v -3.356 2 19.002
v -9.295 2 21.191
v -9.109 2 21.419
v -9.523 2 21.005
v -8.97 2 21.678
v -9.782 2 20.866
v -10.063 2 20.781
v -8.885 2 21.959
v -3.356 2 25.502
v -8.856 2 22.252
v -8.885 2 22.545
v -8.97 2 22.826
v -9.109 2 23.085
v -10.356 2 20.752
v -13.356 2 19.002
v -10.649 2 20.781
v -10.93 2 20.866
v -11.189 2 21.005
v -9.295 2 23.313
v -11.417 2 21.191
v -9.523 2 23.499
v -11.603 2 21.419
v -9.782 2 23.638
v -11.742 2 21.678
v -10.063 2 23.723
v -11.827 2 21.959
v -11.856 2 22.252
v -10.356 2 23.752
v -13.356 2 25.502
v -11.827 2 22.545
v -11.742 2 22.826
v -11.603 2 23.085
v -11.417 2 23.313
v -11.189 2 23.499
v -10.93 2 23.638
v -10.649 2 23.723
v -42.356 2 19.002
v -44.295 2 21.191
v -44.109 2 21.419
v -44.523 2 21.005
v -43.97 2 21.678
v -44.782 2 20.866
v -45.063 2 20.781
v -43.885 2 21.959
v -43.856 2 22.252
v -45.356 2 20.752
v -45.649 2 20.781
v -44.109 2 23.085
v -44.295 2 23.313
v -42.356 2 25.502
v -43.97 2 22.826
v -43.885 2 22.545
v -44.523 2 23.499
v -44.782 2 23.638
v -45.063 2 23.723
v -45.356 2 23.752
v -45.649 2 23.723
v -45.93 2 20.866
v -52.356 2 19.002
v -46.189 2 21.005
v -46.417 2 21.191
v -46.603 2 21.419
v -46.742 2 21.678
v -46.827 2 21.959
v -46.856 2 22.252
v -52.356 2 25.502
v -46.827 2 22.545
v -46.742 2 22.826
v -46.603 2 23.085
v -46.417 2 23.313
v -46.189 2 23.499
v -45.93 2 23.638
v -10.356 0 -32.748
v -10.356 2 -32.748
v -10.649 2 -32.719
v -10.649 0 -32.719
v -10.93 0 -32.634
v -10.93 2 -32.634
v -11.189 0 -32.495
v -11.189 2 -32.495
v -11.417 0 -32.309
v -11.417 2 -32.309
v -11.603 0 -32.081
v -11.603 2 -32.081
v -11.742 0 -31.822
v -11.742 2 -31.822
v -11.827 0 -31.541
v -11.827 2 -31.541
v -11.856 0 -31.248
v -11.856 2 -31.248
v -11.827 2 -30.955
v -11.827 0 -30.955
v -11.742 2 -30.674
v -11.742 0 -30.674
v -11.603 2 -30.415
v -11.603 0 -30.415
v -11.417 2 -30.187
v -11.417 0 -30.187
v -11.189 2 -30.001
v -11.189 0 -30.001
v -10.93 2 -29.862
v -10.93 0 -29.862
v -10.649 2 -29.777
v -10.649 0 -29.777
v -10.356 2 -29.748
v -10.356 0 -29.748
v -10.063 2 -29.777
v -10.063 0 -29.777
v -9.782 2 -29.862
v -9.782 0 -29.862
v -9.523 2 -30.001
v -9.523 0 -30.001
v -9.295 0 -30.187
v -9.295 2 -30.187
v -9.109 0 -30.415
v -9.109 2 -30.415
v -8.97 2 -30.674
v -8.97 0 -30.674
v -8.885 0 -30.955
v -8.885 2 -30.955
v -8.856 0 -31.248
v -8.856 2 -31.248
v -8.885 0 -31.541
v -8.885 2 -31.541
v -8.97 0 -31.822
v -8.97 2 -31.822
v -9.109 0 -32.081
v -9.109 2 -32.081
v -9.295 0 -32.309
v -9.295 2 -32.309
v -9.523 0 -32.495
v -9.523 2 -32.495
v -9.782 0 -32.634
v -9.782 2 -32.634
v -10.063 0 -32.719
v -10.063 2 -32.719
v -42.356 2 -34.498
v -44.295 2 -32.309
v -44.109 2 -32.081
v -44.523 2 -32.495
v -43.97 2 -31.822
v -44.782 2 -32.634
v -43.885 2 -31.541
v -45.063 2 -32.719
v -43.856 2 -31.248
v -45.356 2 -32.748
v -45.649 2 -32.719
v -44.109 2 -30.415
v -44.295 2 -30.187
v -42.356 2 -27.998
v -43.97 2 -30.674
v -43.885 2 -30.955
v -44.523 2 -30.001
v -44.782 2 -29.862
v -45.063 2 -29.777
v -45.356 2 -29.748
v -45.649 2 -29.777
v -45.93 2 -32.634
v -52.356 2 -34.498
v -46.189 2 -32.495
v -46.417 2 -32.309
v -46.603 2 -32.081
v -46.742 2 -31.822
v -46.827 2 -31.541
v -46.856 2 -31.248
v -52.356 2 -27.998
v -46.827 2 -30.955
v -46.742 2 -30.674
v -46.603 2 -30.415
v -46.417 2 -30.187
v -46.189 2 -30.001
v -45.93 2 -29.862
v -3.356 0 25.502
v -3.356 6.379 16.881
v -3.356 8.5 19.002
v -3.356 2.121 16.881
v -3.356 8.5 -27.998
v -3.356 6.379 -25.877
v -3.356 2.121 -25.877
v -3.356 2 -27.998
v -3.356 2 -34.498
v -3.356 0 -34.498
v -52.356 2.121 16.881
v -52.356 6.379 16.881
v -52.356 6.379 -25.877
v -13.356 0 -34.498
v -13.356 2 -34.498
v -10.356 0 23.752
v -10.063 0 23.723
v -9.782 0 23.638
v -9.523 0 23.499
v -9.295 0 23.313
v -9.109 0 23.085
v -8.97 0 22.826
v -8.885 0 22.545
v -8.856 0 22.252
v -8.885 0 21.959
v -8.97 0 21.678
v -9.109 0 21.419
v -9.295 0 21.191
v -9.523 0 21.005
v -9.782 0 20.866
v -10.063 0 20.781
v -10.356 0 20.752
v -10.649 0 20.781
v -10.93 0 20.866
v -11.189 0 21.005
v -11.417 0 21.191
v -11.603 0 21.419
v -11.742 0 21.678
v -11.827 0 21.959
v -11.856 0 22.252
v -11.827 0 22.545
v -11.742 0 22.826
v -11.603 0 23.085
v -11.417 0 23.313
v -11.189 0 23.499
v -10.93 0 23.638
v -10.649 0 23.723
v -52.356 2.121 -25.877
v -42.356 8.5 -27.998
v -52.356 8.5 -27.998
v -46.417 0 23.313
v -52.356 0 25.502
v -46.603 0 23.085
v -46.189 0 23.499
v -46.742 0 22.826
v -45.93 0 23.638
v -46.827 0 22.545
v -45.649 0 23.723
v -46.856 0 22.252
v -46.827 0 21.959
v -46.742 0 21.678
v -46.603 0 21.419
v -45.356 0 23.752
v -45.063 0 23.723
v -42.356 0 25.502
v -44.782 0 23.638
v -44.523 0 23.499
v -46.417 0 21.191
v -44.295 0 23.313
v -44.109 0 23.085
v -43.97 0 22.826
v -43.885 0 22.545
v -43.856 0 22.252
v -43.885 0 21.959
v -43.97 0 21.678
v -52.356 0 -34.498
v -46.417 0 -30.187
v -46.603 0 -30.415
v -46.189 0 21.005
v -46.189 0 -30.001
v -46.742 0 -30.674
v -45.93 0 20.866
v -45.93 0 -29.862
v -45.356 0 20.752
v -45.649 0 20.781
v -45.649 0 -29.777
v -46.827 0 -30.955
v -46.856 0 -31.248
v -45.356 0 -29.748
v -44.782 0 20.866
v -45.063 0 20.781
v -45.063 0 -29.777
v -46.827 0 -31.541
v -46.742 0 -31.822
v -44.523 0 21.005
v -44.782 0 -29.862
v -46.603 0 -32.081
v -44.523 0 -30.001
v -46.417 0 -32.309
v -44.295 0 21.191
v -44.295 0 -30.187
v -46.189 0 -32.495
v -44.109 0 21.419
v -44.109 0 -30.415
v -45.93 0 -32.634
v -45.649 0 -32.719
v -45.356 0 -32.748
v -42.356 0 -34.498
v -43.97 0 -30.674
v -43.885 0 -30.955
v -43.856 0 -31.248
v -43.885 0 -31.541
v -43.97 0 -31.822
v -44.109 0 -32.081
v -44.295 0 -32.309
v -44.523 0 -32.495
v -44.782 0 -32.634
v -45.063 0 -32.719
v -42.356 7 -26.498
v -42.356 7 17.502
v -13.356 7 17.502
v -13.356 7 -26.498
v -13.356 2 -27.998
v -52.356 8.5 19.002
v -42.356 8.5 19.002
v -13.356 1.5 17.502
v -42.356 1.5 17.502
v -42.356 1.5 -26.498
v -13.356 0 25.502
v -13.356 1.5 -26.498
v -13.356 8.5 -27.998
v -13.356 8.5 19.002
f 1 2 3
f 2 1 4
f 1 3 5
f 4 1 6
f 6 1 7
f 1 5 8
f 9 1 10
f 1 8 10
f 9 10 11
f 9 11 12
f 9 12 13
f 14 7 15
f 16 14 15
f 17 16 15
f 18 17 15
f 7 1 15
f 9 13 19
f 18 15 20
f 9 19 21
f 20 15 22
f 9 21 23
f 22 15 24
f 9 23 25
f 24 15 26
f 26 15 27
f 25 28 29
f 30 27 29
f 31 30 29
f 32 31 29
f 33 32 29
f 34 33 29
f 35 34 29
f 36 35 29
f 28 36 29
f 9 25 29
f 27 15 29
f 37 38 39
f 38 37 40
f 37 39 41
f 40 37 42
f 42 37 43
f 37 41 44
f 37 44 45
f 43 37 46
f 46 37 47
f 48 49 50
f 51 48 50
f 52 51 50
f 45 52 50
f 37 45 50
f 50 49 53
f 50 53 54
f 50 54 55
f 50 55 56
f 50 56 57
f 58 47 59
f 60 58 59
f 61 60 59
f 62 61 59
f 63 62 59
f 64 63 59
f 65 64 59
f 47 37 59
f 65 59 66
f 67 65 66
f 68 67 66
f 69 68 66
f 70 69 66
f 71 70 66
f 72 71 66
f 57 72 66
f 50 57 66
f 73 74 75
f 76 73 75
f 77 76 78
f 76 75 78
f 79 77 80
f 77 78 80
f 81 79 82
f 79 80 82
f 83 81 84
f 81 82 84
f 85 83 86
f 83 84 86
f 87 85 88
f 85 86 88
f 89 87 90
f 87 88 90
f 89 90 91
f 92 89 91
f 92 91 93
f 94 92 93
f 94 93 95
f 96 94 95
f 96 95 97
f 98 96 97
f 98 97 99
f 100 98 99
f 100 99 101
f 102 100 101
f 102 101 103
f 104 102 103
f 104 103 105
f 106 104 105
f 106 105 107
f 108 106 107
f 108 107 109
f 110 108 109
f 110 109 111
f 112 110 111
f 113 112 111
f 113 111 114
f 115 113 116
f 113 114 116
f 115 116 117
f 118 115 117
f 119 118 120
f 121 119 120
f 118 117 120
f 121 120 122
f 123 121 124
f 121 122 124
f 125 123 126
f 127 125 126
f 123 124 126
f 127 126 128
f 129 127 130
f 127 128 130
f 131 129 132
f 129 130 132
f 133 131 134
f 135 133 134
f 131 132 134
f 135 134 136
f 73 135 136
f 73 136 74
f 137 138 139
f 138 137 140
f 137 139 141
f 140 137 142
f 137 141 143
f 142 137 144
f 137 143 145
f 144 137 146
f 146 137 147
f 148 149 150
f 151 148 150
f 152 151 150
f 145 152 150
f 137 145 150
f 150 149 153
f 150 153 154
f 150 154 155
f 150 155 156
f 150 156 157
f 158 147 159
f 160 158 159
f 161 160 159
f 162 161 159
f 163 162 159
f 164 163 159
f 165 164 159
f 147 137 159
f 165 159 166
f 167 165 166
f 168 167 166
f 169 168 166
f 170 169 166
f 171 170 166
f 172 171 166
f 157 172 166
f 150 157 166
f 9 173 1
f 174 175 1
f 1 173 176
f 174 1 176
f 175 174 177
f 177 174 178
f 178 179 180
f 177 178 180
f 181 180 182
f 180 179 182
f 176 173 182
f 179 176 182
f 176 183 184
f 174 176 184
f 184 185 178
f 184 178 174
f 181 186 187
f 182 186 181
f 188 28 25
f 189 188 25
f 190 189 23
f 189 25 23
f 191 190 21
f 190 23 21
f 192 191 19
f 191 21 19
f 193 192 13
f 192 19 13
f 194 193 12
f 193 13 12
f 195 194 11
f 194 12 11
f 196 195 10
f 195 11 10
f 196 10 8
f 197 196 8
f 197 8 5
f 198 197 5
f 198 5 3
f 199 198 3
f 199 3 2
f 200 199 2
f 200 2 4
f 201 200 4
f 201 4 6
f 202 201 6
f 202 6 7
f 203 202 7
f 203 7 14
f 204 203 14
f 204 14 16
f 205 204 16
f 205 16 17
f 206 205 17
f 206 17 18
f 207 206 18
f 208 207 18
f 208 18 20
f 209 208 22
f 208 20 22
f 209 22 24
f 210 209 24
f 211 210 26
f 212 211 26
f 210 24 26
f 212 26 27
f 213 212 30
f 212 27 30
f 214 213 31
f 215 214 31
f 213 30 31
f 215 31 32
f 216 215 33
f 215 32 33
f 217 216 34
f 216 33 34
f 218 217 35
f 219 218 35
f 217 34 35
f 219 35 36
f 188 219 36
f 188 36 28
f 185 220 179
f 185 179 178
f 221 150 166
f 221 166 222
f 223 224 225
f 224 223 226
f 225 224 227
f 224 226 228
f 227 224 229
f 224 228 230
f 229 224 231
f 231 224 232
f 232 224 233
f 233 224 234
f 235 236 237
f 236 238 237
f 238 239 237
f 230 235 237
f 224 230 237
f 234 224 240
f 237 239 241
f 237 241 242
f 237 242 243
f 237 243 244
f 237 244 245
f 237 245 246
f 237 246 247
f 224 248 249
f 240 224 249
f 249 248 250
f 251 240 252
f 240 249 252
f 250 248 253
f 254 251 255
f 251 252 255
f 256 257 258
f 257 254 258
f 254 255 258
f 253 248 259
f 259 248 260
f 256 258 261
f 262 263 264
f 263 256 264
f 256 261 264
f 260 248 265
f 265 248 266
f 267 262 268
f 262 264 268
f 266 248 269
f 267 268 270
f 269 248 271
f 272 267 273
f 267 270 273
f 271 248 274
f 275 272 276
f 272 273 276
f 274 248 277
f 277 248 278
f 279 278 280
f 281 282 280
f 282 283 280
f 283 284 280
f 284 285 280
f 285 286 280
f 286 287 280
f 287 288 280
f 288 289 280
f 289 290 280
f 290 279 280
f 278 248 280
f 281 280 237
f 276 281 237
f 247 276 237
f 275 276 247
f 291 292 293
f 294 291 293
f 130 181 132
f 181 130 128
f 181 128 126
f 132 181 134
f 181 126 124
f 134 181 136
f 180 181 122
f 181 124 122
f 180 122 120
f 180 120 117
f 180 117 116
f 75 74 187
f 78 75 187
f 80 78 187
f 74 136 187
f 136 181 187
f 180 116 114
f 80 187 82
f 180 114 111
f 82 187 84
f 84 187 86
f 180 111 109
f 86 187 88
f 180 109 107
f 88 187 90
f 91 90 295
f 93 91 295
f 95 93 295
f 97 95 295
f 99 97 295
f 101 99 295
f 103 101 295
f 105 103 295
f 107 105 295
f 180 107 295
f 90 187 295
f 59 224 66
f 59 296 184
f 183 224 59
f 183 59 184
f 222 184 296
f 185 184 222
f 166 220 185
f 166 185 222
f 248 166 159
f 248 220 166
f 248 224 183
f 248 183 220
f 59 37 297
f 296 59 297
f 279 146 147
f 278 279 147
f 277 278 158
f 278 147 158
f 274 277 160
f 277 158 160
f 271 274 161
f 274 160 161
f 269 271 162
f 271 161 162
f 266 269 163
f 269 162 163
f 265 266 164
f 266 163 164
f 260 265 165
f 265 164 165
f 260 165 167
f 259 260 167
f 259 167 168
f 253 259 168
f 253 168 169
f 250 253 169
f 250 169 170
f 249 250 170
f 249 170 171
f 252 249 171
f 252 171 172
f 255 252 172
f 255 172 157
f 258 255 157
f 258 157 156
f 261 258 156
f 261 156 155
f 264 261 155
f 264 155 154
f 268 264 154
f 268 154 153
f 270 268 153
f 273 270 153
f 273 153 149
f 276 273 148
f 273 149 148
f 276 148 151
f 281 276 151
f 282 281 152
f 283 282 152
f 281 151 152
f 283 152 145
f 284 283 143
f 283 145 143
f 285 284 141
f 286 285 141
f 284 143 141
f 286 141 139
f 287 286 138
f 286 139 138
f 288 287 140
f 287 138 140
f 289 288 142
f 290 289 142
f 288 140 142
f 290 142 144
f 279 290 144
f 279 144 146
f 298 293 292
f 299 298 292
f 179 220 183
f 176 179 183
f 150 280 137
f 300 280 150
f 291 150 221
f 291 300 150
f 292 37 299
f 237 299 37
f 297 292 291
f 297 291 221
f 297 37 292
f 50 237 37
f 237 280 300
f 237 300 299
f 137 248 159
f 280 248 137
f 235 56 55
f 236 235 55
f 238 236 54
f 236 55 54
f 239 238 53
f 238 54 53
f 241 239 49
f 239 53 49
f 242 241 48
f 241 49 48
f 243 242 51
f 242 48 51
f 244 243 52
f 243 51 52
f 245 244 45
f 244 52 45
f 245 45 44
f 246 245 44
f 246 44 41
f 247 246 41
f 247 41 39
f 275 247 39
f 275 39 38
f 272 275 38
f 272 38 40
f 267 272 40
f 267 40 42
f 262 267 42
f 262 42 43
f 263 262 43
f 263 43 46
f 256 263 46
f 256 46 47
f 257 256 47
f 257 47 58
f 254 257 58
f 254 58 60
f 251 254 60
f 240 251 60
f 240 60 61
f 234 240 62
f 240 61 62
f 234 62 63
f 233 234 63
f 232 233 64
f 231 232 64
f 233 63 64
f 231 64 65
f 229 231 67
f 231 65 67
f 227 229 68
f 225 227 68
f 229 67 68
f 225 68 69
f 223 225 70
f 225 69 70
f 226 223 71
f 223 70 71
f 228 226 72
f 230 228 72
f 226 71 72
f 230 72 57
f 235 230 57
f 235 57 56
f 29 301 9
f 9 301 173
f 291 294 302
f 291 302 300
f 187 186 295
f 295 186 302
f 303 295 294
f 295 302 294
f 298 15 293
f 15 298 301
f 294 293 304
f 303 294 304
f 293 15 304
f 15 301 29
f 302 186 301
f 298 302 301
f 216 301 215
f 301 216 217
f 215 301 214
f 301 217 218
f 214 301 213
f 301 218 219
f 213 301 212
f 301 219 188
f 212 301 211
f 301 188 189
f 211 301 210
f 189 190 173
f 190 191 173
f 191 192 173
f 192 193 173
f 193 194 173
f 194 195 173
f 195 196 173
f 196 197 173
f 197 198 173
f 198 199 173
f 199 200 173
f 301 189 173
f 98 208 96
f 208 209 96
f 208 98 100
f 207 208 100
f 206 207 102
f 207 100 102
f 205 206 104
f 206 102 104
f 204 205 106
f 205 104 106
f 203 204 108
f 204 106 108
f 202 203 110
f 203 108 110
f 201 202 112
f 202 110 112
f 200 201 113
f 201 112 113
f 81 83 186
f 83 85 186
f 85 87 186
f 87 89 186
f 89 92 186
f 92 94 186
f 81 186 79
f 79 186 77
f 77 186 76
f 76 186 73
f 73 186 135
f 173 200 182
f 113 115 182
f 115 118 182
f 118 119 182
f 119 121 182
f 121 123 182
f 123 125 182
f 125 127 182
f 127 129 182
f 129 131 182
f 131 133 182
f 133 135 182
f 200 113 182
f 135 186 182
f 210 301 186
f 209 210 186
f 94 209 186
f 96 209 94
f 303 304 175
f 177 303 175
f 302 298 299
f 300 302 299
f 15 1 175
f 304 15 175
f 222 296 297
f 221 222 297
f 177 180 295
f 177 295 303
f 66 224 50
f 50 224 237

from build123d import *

# Parameters (mm, degrees)
SKETCH1_W               = 49
SKETCH1_H               = 60
BOSS_EXTRUDE1_DEPTH     = 15
SKETCH5_W               = 6.5
SKETCH5_H               = 13
CUT_EXTRUDE2_DEPTH      = 54
SKETCH2_R               = 1.5
CUT_EXTRUDE3_DEPTH      = 54
SKETCH7_W               = 6.5
SKETCH7_H               = 13
CUT_EXTRUDE4_DEPTH      = 54
SKETCH8_W               = 29
SKETCH8_H               = 1.5
CUT_EXTRUDE5_DEPTH      = 54
SKETCH9_W               = 29
SKETCH9_H               = 1.5
CUT_EXTRUDE6_DEPTH      = 54
CUT_EXTRUDE7_DEPTH      = 17
CUT_EXTRUDE7_DEPTH_BACK = 76
SKETCH14_W              = 29
SKETCH14_H              = 1.5
SKETCH16_W              = 29
SKETCH16_H              = 1.5
CUT_EXTRUDE8_DEPTH      = 17
SKETCH17_W              = 29
SKETCH17_H              = 0.5
CUT_EXTRUDE9_DEPTH      = 7
SKETCH18_W              = 29
SKETCH18_H              = 0.5
CUT_EXTRUDE10_DEPTH     = 7
SKETCH19_W              = 42.757359313
SKETCH19_H              = 4.257359312
CUT_EXTRUDE12_DEPTH     = 51


with BuildPart() as part:
    # Sketch1 → Boss-Extrude1 (new body)
    with BuildSketch(Plane(origin=(0, 0, 0), x_dir=(1, 0, 0), z_dir=(0, 1, 0))):
        with Locations((-27.855953383, 4.497926564)):
            Rectangle(SKETCH1_W, SKETCH1_H)
    extrude(amount=BOSS_EXTRUDE1_DEPTH)

    # Sketch5 → Cut-Extrude2 (cut)
    with BuildSketch(Plane.ZY.offset(52.355953383)):
        with Locations((-31.247926564, 8.5)):
            Rectangle(SKETCH5_W, SKETCH5_H)
    extrude(amount=-CUT_EXTRUDE2_DEPTH, mode=Mode.SUBTRACT)

    # Sketch2 → Cut-Extrude3 (cut)
    with BuildSketch(Plane(origin=(0, 15, 0), x_dir=(-1, 0, 0), z_dir=(0, 1, 0))):
        with Locations(Location((45.355953383, -31.247926564, 0), (0, 0, 270))):
            Circle(SKETCH2_R)
        with Locations(Location((10.355953383, -31.247926564, 0), (0, 0, 270))):
            Circle(SKETCH2_R)
        with Locations(Location((10.355953383, 22.252073436, 0), (0, 0, 90))):
            Circle(SKETCH2_R)
        with Locations(Location((45.355953383, 22.252073436, 0), (0, 0, 90))):
            Circle(SKETCH2_R)
    extrude(amount=-CUT_EXTRUDE3_DEPTH, mode=Mode.SUBTRACT)

    # Sketch7 → Cut-Extrude4 (cut)
    with BuildSketch(Plane.ZY.offset(52.355953383)):
        with Locations((22.252073436, 8.5)):
            Rectangle(SKETCH7_W, SKETCH7_H)
    extrude(amount=-CUT_EXTRUDE4_DEPTH, mode=Mode.SUBTRACT)

    # Sketch8 → Cut-Extrude5 (cut)
    with BuildSketch(Plane.XY.offset(19.002073436)):
        Polygon((-52.355953383, 8.5), (-42.355953383, 8.5), (-13.355953383, 8.5), (-3.355953383, 8.5), (-3.355953383, 15), (-52.355953383, 15), align=None)
        with Locations((-27.855953383, 7.75)):
            Rectangle(SKETCH8_W, SKETCH8_H)
    extrude(amount=-CUT_EXTRUDE5_DEPTH, mode=Mode.SUBTRACT)

    # Sketch9 → Cut-Extrude6 (cut)
    with BuildSketch(Plane(origin=(0, 7, 0), x_dir=(-1, 0, 0), z_dir=(0, 1, 0))):
        with Locations((27.855953383, -27.247926564)):
            Rectangle(SKETCH9_W, SKETCH9_H)
    extrude(amount=-CUT_EXTRUDE6_DEPTH, mode=Mode.SUBTRACT)

    # Sketch14 → Cut-Extrude7 (cut, two sides: drawn at the far end of the back side and taken through both)
    with BuildSketch(Plane(origin=(0, 0, -26.497926564), x_dir=(-1, 0, 0), z_dir=(0, 0, -1)).offset(-CUT_EXTRUDE7_DEPTH_BACK)):
        with Locations((27.855953383, 0.75)):
            Rectangle(SKETCH14_W, SKETCH14_H)
    extrude(amount=CUT_EXTRUDE7_DEPTH + CUT_EXTRUDE7_DEPTH_BACK, mode=Mode.SUBTRACT)

    # Sketch16 → Cut-Extrude8 (cut)
    with BuildSketch(Plane(origin=(0, 7, 0), x_dir=(-1, 0, 0), z_dir=(0, 1, 0))):
        with Locations((27.855953383, 18.252073436)):
            Rectangle(SKETCH16_W, SKETCH16_H)
    extrude(amount=-CUT_EXTRUDE8_DEPTH, mode=Mode.SUBTRACT)

    # Sketch17 → Cut-Extrude9 (cut)
    with BuildSketch(Plane.XY.offset(25.502073436)):
        with Locations((-27.855953383, 1.75)):
            Rectangle(SKETCH17_W, SKETCH17_H)
    extrude(amount=-CUT_EXTRUDE9_DEPTH, mode=Mode.SUBTRACT)

    # Sketch18 → Cut-Extrude10 (cut)
    with BuildSketch(Plane(origin=(0, 0, -34.497926564), x_dir=(-1, 0, 0), z_dir=(0, 0, -1))):
        with Locations((27.855953383, 1.75)):
            Rectangle(SKETCH18_W, SKETCH18_H)
    extrude(amount=-CUT_EXTRUDE10_DEPTH, mode=Mode.SUBTRACT)

    # Sketch19 → Cut-Extrude12 (cut)
    with BuildSketch(Plane.ZY.offset(52.355953383)):
        with Locations((-4.497926565, 4.25)):
            Rectangle(SKETCH19_W, SKETCH19_H)
    extrude(amount=-CUT_EXTRUDE12_DEPTH, mode=Mode.SUBTRACT)


solid = part.part
